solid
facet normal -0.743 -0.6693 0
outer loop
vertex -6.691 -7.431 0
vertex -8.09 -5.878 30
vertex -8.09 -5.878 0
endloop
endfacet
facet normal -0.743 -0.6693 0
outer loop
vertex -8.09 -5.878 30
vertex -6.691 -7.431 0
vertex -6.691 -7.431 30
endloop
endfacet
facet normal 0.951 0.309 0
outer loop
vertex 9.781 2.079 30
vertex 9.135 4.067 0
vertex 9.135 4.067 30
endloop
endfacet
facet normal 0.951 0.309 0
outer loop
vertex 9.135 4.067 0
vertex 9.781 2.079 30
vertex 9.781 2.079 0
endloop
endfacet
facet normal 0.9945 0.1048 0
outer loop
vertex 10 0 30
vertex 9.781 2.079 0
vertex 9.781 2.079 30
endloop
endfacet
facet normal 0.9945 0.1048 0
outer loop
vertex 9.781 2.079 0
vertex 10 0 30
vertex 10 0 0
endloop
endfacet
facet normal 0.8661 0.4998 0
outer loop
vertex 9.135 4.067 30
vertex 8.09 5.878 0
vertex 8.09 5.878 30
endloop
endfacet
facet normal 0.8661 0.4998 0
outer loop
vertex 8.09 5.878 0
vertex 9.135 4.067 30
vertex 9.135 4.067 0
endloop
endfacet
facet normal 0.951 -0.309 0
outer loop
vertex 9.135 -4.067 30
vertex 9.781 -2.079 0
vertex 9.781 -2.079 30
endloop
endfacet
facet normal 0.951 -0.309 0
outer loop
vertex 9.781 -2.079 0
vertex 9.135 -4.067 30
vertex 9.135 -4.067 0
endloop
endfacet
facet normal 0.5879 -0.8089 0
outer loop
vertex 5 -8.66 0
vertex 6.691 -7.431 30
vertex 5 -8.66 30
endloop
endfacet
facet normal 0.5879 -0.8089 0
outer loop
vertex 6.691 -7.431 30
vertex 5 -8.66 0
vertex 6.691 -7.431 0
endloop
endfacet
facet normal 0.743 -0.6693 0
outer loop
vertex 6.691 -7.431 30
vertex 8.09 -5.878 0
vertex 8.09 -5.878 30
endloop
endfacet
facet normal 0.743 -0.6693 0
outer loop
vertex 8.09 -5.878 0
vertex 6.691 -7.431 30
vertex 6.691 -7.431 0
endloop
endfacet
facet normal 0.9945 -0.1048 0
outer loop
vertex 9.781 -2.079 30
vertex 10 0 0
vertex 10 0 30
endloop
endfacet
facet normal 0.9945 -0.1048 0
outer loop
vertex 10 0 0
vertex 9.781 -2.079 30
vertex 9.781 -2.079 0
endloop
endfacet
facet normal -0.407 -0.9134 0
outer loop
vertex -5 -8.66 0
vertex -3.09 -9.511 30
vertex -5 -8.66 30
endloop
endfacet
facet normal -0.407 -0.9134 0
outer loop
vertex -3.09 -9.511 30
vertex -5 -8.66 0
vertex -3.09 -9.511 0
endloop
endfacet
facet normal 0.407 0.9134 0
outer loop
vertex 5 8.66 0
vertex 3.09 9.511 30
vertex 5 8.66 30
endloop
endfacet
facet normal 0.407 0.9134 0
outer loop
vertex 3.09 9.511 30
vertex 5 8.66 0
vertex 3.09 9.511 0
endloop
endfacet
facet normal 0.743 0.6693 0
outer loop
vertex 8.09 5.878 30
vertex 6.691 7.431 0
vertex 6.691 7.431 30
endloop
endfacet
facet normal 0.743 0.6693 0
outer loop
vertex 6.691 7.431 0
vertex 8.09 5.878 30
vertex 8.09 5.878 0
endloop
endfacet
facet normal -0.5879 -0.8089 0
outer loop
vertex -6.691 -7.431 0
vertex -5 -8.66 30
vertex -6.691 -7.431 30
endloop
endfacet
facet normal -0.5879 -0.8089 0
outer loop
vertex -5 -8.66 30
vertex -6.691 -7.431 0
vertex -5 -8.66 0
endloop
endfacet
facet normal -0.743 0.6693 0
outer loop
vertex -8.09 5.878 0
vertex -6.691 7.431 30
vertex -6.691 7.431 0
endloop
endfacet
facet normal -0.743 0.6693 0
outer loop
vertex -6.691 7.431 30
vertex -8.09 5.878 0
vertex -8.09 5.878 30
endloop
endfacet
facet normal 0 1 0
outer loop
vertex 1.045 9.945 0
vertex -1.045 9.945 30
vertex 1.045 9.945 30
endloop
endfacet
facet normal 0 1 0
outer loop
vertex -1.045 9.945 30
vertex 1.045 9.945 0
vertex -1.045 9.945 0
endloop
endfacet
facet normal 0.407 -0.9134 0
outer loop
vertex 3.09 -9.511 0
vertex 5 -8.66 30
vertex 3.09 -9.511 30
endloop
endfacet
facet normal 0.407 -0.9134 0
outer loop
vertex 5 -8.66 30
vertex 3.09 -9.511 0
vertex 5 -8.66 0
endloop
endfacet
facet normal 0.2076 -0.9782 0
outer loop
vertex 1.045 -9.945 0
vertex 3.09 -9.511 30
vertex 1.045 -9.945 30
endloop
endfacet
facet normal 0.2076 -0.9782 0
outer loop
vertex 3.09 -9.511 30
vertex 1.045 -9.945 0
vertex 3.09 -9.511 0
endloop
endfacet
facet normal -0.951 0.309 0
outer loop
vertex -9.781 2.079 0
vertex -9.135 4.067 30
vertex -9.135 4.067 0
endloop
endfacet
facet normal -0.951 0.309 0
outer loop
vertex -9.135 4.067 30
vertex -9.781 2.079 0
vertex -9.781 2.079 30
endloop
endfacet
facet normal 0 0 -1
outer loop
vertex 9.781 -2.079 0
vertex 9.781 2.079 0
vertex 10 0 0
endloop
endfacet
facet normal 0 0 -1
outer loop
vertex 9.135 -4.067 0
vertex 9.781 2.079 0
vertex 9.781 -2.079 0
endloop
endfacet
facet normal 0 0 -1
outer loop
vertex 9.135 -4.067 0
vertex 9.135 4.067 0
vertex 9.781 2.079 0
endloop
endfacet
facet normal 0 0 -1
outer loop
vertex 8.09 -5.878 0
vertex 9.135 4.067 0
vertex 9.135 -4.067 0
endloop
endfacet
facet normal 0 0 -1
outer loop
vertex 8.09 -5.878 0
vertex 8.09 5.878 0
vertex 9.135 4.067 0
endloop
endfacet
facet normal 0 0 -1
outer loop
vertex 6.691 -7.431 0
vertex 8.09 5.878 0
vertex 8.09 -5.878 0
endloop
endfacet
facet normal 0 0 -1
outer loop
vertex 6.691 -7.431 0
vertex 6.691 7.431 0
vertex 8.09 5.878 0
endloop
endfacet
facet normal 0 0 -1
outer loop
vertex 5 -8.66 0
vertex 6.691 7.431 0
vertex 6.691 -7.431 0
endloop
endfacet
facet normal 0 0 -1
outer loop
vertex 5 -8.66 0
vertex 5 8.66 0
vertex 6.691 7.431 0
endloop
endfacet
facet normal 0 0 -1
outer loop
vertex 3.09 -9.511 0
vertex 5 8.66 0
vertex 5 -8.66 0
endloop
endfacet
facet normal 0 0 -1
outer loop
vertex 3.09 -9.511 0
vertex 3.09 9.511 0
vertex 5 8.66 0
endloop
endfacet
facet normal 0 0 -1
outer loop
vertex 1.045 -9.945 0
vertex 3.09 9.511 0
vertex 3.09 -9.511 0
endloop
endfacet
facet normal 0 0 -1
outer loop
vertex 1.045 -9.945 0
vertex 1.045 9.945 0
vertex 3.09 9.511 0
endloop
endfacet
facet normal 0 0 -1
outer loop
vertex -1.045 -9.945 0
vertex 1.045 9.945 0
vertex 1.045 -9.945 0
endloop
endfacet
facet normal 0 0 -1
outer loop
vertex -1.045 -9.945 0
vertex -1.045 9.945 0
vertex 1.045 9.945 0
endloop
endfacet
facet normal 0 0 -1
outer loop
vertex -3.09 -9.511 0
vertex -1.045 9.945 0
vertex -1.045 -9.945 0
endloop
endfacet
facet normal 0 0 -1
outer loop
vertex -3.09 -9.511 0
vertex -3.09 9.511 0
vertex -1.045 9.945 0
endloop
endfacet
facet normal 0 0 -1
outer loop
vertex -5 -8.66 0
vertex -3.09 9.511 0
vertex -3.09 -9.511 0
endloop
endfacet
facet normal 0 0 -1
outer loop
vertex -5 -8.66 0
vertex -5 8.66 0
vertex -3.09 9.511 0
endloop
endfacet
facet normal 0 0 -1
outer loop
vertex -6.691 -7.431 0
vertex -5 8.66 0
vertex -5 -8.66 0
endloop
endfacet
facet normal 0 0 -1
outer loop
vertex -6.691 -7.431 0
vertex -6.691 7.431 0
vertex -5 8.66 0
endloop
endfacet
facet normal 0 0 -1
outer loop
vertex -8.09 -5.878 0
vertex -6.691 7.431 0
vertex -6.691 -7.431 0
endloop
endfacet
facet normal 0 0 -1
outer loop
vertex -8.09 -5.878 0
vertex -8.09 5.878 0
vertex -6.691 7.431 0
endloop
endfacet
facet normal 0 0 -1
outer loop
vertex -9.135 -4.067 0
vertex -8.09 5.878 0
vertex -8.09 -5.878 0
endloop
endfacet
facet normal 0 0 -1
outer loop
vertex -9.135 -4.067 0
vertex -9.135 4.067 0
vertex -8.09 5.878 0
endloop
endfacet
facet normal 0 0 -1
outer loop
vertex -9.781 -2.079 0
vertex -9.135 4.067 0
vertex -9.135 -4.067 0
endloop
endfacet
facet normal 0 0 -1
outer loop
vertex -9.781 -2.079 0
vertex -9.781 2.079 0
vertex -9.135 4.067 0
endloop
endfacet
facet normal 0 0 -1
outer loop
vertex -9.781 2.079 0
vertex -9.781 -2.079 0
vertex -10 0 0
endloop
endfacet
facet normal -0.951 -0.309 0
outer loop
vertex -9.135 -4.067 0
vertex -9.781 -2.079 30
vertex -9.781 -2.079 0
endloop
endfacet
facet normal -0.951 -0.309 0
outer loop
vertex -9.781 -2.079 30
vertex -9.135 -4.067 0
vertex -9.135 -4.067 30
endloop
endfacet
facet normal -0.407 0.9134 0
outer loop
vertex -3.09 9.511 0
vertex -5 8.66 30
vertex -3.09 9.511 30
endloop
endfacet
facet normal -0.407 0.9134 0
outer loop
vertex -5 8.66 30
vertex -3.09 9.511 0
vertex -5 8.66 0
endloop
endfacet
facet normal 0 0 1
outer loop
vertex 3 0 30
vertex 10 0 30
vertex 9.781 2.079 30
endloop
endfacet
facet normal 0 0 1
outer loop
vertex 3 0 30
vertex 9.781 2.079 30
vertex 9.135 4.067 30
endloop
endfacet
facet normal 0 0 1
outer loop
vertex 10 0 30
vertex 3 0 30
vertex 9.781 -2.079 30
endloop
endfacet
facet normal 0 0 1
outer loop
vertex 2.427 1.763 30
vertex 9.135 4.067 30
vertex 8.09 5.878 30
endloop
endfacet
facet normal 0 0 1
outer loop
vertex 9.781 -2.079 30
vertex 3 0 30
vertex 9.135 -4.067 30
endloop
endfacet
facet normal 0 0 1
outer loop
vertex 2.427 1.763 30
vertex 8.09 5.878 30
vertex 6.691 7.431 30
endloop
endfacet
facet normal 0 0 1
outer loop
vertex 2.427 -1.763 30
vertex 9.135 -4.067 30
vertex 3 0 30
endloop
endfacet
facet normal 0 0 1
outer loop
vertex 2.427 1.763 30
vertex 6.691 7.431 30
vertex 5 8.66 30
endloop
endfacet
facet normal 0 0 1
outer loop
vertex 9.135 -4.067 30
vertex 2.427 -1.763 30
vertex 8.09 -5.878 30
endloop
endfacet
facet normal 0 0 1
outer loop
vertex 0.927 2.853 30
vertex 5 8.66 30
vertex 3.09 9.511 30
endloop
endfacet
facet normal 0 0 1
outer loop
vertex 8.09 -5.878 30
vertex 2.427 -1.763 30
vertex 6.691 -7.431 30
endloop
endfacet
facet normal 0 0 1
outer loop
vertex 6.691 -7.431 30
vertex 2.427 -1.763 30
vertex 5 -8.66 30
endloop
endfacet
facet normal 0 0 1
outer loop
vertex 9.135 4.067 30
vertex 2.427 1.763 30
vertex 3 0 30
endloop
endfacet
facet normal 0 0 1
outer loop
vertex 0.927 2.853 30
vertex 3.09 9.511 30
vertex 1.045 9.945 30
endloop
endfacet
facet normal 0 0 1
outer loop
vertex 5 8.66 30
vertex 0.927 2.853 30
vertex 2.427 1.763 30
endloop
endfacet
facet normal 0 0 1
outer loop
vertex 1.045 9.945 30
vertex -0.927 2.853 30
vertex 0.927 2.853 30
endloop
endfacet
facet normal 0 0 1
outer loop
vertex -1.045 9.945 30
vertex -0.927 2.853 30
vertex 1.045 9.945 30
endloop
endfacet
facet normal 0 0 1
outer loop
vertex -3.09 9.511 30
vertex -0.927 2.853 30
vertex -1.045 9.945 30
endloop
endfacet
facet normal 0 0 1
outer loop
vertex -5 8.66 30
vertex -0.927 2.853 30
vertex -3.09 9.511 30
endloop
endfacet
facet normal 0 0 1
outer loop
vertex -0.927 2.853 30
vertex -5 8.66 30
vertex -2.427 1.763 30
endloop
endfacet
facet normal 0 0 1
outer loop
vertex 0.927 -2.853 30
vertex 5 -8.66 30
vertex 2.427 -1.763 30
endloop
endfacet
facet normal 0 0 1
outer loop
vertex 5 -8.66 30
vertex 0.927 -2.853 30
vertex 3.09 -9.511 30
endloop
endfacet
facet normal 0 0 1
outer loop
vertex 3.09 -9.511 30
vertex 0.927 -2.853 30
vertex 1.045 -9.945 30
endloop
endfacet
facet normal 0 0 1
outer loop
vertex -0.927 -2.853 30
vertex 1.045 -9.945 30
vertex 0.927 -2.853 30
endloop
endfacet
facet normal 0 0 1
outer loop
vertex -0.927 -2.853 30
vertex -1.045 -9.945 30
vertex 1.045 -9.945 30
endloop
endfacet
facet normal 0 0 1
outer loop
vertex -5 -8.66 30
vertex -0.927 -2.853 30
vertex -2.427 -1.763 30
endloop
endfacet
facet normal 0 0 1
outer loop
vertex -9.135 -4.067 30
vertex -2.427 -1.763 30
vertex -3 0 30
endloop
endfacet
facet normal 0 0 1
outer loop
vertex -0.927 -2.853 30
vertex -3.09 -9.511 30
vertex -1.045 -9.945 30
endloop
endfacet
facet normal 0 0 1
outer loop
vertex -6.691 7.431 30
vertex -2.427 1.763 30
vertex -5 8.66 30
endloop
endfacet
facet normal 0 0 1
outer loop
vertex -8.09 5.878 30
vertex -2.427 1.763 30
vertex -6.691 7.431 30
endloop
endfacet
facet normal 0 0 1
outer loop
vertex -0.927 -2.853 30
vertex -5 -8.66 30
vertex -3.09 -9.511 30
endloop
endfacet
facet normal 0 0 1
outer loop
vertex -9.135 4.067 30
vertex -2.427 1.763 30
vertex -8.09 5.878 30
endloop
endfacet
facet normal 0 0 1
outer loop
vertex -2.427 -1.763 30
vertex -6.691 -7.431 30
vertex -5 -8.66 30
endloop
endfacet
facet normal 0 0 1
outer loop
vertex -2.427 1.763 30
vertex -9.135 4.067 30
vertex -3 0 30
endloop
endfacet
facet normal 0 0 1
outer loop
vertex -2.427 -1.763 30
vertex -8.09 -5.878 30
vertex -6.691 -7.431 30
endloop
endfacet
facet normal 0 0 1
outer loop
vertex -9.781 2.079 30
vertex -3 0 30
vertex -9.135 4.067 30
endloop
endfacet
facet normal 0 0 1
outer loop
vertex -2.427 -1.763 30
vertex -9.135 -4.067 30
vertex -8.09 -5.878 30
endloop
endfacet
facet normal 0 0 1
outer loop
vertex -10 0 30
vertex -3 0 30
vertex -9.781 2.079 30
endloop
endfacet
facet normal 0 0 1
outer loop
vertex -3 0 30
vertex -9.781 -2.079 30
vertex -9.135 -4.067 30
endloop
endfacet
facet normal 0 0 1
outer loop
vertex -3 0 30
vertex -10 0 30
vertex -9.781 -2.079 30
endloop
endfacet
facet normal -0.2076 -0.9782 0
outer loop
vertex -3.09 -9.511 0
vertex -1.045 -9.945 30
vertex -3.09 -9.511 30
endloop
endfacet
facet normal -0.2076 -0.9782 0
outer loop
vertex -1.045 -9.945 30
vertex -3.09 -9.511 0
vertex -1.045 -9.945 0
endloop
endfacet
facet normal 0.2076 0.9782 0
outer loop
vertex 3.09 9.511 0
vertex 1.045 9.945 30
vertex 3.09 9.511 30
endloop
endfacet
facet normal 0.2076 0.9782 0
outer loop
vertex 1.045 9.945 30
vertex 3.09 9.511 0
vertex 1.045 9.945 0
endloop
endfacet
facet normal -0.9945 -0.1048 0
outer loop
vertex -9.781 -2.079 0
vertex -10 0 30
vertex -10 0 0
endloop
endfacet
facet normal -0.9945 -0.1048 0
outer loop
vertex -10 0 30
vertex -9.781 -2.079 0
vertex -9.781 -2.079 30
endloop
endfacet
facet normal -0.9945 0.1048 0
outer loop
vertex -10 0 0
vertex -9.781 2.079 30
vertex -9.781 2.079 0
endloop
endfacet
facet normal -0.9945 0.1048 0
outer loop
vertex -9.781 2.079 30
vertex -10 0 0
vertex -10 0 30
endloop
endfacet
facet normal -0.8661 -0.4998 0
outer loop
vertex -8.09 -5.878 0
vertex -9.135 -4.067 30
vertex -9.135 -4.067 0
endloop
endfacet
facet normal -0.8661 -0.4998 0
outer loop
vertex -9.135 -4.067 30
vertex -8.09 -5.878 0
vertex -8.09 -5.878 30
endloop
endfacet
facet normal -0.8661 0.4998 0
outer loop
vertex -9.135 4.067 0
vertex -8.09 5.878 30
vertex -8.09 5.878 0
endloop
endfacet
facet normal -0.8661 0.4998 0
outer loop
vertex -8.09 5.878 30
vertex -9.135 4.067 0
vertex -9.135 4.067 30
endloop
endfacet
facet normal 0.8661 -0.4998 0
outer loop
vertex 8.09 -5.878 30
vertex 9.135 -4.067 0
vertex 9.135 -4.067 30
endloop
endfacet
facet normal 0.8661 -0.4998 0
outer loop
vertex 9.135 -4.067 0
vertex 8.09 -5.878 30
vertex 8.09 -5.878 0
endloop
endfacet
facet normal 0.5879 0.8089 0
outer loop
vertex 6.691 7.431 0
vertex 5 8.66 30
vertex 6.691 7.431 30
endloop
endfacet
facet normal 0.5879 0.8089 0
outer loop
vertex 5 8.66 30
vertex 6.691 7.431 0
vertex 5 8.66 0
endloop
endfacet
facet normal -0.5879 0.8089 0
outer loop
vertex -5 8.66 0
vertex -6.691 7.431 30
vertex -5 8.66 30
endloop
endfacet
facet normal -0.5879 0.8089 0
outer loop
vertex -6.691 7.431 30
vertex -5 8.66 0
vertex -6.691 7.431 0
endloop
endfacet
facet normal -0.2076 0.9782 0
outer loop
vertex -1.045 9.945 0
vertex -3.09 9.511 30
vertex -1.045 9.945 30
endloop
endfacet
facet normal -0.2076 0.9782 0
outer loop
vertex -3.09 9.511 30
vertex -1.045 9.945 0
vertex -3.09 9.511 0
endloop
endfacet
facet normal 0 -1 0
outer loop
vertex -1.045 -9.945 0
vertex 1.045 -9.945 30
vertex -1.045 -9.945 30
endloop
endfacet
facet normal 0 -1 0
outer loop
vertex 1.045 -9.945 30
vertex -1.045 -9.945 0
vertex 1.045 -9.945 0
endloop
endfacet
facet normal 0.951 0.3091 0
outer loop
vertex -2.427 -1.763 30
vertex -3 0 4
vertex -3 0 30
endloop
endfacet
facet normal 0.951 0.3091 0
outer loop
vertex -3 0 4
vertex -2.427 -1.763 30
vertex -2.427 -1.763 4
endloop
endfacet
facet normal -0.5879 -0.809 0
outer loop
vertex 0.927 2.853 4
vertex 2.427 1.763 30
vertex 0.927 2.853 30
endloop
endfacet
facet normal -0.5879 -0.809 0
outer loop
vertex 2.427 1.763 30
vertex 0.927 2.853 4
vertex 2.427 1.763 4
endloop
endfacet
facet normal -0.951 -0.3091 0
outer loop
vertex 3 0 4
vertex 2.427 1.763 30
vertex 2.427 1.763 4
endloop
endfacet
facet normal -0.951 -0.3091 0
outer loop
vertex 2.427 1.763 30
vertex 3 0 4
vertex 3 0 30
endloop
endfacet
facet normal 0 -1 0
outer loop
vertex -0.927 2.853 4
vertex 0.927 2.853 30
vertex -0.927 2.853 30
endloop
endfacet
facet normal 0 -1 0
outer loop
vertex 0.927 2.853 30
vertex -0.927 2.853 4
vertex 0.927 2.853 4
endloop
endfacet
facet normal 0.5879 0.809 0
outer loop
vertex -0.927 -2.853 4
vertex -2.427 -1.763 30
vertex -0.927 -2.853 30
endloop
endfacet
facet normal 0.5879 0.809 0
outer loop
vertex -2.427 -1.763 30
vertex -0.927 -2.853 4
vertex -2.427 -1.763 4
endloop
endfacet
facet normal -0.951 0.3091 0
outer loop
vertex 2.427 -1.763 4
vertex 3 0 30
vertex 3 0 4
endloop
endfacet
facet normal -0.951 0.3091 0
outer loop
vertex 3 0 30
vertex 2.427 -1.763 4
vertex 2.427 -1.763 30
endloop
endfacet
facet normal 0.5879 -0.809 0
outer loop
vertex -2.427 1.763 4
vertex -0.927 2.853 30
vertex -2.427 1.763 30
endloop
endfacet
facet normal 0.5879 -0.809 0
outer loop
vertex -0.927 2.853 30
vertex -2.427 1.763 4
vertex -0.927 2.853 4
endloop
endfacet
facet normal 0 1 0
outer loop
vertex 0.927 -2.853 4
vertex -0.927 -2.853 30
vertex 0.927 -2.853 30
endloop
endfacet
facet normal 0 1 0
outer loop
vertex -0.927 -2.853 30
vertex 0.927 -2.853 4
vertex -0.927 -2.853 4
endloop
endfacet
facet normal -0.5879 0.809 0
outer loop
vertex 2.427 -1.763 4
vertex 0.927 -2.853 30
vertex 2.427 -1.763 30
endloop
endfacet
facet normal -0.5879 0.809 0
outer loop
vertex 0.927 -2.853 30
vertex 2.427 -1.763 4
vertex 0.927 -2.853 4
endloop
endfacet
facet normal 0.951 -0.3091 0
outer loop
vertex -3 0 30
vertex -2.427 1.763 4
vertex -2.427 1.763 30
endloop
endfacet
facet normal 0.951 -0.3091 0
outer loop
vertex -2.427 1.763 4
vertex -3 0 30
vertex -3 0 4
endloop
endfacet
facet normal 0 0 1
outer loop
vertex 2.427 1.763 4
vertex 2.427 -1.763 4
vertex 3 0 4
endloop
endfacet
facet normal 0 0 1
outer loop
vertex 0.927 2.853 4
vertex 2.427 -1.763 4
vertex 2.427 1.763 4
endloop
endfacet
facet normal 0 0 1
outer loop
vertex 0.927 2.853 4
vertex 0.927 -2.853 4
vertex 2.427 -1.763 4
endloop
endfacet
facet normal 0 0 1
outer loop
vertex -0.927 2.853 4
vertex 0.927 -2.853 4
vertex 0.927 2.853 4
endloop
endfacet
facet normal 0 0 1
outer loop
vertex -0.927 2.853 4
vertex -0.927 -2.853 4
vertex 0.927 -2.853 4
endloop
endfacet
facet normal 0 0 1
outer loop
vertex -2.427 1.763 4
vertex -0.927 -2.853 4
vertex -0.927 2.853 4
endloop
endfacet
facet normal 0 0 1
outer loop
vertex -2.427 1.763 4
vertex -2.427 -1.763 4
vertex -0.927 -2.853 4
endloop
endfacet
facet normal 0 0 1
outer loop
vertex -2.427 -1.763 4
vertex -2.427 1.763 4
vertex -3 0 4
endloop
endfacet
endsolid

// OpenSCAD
difference() {
cylinder(r=10, h=30);
translate([0,0,4]) cylinder(r=3, h=28 );
}
